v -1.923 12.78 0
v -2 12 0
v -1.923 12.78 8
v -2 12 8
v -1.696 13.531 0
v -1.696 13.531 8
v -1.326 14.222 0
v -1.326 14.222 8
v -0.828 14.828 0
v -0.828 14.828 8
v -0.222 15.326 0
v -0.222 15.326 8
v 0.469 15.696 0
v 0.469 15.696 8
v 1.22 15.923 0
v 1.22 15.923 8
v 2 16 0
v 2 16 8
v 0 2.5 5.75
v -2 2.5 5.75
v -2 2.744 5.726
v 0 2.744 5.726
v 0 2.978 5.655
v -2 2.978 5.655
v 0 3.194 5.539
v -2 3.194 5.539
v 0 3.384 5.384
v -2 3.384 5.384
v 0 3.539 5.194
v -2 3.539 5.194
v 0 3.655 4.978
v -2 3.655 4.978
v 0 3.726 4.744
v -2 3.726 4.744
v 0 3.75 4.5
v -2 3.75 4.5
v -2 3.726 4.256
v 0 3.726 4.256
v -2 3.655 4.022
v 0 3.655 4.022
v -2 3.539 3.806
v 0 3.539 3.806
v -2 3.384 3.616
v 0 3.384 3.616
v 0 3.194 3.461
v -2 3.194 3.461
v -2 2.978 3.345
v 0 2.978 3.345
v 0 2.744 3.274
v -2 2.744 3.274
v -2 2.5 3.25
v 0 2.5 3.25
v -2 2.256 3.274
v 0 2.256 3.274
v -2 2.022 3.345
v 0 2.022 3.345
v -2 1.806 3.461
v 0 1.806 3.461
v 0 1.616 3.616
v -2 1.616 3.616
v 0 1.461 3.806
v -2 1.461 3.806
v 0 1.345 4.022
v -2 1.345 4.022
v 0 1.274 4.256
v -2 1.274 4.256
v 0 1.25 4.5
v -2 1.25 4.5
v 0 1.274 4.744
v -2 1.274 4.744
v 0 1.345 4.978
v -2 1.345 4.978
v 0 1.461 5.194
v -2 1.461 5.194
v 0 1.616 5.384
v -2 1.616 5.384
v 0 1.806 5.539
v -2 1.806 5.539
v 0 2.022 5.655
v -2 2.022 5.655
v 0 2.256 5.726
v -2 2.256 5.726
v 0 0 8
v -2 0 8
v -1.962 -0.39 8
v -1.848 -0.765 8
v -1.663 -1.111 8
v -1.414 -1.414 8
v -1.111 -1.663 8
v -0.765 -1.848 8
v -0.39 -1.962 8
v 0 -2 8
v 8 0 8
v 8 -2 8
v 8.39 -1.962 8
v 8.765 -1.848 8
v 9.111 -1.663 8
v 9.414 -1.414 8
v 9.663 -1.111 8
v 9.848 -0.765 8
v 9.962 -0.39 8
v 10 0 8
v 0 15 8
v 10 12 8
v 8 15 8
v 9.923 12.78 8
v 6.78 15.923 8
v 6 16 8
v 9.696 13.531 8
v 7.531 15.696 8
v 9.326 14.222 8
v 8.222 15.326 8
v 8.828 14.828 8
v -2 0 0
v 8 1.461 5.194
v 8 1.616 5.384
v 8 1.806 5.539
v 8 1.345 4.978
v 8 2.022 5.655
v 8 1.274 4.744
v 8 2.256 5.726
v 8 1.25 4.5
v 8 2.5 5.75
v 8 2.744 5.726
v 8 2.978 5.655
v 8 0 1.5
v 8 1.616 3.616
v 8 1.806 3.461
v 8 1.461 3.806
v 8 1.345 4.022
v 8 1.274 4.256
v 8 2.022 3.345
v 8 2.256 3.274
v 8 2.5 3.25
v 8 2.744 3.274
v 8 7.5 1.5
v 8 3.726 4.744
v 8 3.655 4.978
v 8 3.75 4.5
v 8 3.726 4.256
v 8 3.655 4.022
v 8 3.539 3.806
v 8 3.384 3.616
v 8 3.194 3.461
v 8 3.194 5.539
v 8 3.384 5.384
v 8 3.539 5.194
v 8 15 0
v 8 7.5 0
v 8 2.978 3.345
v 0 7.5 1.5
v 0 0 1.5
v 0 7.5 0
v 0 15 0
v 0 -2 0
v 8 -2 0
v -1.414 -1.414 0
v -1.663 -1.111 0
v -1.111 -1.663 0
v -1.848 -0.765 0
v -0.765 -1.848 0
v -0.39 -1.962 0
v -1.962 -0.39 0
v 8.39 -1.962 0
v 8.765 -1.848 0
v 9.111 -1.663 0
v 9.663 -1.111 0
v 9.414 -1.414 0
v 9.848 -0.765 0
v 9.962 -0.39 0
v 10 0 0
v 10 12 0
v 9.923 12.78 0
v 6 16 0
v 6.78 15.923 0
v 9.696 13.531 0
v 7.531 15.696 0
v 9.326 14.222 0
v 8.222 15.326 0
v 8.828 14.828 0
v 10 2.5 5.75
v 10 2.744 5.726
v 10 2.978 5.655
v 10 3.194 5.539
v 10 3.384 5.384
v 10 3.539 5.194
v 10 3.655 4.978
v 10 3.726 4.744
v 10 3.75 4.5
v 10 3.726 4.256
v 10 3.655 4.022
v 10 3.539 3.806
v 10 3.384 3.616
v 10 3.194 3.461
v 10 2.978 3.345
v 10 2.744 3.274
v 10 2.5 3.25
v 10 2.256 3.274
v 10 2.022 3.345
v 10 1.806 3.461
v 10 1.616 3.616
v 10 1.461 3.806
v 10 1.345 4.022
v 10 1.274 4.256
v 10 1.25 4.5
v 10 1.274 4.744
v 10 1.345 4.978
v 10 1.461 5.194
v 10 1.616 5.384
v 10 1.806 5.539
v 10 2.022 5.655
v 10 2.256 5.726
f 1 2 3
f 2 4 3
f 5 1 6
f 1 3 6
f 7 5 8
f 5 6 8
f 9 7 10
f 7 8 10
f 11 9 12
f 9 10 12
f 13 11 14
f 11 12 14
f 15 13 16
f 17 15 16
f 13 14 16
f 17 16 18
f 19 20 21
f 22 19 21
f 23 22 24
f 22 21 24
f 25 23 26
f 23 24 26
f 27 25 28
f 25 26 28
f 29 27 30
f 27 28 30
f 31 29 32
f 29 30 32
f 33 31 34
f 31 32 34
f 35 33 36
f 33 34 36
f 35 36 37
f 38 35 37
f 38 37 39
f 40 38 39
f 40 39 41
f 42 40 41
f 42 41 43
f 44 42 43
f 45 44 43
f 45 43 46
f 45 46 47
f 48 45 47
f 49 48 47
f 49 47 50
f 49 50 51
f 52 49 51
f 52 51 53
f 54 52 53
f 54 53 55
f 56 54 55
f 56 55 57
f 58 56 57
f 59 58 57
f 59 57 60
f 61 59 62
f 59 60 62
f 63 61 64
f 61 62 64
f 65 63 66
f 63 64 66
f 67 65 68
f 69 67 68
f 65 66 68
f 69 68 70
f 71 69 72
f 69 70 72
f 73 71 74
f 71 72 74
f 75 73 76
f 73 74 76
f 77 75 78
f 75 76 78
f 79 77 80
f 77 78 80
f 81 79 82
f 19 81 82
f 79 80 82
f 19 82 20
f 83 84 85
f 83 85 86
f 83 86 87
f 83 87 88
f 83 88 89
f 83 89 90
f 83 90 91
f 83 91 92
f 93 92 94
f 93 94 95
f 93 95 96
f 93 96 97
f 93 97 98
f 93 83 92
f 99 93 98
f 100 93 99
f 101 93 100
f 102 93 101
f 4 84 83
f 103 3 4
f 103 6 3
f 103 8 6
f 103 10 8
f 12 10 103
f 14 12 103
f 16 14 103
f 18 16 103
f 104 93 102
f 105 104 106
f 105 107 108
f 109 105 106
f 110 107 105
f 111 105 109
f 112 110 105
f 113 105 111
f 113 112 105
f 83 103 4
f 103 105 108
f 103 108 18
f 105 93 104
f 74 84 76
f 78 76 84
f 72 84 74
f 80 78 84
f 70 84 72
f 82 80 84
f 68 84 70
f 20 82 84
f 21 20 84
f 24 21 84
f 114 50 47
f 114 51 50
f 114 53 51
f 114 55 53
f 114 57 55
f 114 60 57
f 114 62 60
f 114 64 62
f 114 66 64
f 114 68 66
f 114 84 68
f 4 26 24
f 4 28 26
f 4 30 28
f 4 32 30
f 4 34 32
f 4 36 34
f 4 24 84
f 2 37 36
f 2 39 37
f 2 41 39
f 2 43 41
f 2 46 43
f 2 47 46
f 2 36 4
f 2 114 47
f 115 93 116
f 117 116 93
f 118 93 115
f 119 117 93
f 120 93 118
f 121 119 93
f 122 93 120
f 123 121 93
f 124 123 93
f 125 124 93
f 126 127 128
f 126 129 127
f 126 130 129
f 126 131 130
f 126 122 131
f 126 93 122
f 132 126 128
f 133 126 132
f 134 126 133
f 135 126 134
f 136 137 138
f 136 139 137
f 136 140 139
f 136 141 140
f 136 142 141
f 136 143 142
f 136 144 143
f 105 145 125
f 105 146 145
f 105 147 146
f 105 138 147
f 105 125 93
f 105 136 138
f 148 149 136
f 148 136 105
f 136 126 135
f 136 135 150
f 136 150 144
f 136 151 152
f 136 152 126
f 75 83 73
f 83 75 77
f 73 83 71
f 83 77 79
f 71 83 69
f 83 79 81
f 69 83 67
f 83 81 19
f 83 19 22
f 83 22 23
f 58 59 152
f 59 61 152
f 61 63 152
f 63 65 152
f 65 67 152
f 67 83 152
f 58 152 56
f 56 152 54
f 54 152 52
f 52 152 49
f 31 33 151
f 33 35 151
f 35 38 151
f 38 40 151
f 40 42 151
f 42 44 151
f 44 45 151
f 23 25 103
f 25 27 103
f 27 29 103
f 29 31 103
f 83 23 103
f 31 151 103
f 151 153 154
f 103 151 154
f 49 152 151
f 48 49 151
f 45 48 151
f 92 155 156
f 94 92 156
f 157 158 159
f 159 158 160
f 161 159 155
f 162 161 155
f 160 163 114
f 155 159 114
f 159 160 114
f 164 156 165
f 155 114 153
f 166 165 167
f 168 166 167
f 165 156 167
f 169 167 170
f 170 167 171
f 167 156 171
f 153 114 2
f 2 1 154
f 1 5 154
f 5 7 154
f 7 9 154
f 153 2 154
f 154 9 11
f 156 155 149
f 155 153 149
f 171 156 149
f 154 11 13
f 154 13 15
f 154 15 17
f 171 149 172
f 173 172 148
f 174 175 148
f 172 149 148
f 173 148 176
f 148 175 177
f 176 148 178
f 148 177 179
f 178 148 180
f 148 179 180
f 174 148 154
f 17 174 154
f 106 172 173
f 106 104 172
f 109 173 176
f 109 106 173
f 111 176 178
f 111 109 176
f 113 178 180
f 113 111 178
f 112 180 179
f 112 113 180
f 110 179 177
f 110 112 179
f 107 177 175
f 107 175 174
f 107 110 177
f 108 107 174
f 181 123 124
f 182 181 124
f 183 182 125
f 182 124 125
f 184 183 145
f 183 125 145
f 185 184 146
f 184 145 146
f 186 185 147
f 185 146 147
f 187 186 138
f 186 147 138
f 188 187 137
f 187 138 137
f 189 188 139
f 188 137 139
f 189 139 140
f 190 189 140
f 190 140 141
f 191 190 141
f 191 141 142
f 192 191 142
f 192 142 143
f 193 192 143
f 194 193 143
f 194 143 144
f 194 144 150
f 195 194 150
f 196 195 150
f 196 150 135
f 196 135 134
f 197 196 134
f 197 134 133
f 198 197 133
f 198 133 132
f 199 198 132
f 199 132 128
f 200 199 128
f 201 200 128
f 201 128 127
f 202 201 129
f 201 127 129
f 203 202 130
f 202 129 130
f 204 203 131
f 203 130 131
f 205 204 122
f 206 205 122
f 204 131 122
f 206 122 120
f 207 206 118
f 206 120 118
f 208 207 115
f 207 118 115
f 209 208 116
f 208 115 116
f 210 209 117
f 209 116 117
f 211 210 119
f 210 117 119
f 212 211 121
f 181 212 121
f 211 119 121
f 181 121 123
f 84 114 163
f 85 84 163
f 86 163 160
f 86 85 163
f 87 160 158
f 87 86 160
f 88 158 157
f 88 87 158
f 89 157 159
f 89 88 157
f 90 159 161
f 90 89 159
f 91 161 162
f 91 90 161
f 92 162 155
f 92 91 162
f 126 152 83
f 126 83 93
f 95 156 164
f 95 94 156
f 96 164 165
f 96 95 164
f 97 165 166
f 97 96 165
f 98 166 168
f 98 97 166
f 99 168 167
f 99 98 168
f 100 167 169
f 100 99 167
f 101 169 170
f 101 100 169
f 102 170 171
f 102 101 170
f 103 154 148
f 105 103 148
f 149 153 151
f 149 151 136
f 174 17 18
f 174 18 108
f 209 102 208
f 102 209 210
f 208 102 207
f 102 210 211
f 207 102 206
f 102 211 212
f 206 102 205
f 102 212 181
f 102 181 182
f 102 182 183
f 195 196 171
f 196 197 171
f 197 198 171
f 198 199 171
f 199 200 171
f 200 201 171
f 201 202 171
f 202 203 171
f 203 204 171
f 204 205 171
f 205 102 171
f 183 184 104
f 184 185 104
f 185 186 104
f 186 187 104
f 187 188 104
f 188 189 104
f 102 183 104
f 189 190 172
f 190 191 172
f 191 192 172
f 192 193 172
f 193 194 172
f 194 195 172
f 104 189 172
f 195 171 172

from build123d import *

# Parameters (mm, degrees)
SKETCH_1_W         = 12
SKETCH_1_H         = 18
SKETCH_1_W_2       = 8
SKETCH_1_H_2       = 15
EXTRUDE_1_DEPTH    = 8
SKETCH_1_3_W       = 8
SKETCH_1_3_H       = 7.5
EXTRUDE_2_DEPTH    = 1.5
HOLE_WIZARD_M3_1_D = 2.5
FILLET_2_R         = 4
FILLET_3_R         = 2


with BuildPart() as part:
    # 草图1 → 凸台-拉伸1 (new body)
    with BuildSketch(Plane.XY):
        with Locations((4, 7)):
            Rectangle(SKETCH_1_W, SKETCH_1_H)
        with Locations((4, 7.5)):
            Rectangle(SKETCH_1_W_2, SKETCH_1_H_2, mode=Mode.SUBTRACT)
    extrude(amount=EXTRUDE_1_DEPTH)

    # 草图1<3> → 凸台-拉伸2 (add)
    with BuildSketch(Plane.XY):
        with Locations((4, 3.75)):
            Rectangle(SKETCH_1_3_W, SKETCH_1_3_H)
    extrude(amount=EXTRUDE_2_DEPTH)

    # M3 螺纹孔1 (through all)
    with Locations(Plane(origin=(10, 0, 0), x_dir=(0, 0, -1), z_dir=(1, 0, 0))):
        with Locations((-4.5, 2.5)):
            Hole(HOLE_WIZARD_M3_1_D / 2)

    # 圆角2
    fillet_2_edges = [part.edges().sort_by_distance(p)[0] for p in [
        (-2, 16, 4),
        (10, 16, 4),
    ]]
    fillet(fillet_2_edges, radius=FILLET_2_R)

    # 圆角3
    fillet_3_edges = [part.edges().sort_by_distance(p)[0] for p in [
        (10, -2, 4),
        (-2, -2, 4),
    ]]
    fillet(fillet_3_edges, radius=FILLET_3_R)


solid = part.part
